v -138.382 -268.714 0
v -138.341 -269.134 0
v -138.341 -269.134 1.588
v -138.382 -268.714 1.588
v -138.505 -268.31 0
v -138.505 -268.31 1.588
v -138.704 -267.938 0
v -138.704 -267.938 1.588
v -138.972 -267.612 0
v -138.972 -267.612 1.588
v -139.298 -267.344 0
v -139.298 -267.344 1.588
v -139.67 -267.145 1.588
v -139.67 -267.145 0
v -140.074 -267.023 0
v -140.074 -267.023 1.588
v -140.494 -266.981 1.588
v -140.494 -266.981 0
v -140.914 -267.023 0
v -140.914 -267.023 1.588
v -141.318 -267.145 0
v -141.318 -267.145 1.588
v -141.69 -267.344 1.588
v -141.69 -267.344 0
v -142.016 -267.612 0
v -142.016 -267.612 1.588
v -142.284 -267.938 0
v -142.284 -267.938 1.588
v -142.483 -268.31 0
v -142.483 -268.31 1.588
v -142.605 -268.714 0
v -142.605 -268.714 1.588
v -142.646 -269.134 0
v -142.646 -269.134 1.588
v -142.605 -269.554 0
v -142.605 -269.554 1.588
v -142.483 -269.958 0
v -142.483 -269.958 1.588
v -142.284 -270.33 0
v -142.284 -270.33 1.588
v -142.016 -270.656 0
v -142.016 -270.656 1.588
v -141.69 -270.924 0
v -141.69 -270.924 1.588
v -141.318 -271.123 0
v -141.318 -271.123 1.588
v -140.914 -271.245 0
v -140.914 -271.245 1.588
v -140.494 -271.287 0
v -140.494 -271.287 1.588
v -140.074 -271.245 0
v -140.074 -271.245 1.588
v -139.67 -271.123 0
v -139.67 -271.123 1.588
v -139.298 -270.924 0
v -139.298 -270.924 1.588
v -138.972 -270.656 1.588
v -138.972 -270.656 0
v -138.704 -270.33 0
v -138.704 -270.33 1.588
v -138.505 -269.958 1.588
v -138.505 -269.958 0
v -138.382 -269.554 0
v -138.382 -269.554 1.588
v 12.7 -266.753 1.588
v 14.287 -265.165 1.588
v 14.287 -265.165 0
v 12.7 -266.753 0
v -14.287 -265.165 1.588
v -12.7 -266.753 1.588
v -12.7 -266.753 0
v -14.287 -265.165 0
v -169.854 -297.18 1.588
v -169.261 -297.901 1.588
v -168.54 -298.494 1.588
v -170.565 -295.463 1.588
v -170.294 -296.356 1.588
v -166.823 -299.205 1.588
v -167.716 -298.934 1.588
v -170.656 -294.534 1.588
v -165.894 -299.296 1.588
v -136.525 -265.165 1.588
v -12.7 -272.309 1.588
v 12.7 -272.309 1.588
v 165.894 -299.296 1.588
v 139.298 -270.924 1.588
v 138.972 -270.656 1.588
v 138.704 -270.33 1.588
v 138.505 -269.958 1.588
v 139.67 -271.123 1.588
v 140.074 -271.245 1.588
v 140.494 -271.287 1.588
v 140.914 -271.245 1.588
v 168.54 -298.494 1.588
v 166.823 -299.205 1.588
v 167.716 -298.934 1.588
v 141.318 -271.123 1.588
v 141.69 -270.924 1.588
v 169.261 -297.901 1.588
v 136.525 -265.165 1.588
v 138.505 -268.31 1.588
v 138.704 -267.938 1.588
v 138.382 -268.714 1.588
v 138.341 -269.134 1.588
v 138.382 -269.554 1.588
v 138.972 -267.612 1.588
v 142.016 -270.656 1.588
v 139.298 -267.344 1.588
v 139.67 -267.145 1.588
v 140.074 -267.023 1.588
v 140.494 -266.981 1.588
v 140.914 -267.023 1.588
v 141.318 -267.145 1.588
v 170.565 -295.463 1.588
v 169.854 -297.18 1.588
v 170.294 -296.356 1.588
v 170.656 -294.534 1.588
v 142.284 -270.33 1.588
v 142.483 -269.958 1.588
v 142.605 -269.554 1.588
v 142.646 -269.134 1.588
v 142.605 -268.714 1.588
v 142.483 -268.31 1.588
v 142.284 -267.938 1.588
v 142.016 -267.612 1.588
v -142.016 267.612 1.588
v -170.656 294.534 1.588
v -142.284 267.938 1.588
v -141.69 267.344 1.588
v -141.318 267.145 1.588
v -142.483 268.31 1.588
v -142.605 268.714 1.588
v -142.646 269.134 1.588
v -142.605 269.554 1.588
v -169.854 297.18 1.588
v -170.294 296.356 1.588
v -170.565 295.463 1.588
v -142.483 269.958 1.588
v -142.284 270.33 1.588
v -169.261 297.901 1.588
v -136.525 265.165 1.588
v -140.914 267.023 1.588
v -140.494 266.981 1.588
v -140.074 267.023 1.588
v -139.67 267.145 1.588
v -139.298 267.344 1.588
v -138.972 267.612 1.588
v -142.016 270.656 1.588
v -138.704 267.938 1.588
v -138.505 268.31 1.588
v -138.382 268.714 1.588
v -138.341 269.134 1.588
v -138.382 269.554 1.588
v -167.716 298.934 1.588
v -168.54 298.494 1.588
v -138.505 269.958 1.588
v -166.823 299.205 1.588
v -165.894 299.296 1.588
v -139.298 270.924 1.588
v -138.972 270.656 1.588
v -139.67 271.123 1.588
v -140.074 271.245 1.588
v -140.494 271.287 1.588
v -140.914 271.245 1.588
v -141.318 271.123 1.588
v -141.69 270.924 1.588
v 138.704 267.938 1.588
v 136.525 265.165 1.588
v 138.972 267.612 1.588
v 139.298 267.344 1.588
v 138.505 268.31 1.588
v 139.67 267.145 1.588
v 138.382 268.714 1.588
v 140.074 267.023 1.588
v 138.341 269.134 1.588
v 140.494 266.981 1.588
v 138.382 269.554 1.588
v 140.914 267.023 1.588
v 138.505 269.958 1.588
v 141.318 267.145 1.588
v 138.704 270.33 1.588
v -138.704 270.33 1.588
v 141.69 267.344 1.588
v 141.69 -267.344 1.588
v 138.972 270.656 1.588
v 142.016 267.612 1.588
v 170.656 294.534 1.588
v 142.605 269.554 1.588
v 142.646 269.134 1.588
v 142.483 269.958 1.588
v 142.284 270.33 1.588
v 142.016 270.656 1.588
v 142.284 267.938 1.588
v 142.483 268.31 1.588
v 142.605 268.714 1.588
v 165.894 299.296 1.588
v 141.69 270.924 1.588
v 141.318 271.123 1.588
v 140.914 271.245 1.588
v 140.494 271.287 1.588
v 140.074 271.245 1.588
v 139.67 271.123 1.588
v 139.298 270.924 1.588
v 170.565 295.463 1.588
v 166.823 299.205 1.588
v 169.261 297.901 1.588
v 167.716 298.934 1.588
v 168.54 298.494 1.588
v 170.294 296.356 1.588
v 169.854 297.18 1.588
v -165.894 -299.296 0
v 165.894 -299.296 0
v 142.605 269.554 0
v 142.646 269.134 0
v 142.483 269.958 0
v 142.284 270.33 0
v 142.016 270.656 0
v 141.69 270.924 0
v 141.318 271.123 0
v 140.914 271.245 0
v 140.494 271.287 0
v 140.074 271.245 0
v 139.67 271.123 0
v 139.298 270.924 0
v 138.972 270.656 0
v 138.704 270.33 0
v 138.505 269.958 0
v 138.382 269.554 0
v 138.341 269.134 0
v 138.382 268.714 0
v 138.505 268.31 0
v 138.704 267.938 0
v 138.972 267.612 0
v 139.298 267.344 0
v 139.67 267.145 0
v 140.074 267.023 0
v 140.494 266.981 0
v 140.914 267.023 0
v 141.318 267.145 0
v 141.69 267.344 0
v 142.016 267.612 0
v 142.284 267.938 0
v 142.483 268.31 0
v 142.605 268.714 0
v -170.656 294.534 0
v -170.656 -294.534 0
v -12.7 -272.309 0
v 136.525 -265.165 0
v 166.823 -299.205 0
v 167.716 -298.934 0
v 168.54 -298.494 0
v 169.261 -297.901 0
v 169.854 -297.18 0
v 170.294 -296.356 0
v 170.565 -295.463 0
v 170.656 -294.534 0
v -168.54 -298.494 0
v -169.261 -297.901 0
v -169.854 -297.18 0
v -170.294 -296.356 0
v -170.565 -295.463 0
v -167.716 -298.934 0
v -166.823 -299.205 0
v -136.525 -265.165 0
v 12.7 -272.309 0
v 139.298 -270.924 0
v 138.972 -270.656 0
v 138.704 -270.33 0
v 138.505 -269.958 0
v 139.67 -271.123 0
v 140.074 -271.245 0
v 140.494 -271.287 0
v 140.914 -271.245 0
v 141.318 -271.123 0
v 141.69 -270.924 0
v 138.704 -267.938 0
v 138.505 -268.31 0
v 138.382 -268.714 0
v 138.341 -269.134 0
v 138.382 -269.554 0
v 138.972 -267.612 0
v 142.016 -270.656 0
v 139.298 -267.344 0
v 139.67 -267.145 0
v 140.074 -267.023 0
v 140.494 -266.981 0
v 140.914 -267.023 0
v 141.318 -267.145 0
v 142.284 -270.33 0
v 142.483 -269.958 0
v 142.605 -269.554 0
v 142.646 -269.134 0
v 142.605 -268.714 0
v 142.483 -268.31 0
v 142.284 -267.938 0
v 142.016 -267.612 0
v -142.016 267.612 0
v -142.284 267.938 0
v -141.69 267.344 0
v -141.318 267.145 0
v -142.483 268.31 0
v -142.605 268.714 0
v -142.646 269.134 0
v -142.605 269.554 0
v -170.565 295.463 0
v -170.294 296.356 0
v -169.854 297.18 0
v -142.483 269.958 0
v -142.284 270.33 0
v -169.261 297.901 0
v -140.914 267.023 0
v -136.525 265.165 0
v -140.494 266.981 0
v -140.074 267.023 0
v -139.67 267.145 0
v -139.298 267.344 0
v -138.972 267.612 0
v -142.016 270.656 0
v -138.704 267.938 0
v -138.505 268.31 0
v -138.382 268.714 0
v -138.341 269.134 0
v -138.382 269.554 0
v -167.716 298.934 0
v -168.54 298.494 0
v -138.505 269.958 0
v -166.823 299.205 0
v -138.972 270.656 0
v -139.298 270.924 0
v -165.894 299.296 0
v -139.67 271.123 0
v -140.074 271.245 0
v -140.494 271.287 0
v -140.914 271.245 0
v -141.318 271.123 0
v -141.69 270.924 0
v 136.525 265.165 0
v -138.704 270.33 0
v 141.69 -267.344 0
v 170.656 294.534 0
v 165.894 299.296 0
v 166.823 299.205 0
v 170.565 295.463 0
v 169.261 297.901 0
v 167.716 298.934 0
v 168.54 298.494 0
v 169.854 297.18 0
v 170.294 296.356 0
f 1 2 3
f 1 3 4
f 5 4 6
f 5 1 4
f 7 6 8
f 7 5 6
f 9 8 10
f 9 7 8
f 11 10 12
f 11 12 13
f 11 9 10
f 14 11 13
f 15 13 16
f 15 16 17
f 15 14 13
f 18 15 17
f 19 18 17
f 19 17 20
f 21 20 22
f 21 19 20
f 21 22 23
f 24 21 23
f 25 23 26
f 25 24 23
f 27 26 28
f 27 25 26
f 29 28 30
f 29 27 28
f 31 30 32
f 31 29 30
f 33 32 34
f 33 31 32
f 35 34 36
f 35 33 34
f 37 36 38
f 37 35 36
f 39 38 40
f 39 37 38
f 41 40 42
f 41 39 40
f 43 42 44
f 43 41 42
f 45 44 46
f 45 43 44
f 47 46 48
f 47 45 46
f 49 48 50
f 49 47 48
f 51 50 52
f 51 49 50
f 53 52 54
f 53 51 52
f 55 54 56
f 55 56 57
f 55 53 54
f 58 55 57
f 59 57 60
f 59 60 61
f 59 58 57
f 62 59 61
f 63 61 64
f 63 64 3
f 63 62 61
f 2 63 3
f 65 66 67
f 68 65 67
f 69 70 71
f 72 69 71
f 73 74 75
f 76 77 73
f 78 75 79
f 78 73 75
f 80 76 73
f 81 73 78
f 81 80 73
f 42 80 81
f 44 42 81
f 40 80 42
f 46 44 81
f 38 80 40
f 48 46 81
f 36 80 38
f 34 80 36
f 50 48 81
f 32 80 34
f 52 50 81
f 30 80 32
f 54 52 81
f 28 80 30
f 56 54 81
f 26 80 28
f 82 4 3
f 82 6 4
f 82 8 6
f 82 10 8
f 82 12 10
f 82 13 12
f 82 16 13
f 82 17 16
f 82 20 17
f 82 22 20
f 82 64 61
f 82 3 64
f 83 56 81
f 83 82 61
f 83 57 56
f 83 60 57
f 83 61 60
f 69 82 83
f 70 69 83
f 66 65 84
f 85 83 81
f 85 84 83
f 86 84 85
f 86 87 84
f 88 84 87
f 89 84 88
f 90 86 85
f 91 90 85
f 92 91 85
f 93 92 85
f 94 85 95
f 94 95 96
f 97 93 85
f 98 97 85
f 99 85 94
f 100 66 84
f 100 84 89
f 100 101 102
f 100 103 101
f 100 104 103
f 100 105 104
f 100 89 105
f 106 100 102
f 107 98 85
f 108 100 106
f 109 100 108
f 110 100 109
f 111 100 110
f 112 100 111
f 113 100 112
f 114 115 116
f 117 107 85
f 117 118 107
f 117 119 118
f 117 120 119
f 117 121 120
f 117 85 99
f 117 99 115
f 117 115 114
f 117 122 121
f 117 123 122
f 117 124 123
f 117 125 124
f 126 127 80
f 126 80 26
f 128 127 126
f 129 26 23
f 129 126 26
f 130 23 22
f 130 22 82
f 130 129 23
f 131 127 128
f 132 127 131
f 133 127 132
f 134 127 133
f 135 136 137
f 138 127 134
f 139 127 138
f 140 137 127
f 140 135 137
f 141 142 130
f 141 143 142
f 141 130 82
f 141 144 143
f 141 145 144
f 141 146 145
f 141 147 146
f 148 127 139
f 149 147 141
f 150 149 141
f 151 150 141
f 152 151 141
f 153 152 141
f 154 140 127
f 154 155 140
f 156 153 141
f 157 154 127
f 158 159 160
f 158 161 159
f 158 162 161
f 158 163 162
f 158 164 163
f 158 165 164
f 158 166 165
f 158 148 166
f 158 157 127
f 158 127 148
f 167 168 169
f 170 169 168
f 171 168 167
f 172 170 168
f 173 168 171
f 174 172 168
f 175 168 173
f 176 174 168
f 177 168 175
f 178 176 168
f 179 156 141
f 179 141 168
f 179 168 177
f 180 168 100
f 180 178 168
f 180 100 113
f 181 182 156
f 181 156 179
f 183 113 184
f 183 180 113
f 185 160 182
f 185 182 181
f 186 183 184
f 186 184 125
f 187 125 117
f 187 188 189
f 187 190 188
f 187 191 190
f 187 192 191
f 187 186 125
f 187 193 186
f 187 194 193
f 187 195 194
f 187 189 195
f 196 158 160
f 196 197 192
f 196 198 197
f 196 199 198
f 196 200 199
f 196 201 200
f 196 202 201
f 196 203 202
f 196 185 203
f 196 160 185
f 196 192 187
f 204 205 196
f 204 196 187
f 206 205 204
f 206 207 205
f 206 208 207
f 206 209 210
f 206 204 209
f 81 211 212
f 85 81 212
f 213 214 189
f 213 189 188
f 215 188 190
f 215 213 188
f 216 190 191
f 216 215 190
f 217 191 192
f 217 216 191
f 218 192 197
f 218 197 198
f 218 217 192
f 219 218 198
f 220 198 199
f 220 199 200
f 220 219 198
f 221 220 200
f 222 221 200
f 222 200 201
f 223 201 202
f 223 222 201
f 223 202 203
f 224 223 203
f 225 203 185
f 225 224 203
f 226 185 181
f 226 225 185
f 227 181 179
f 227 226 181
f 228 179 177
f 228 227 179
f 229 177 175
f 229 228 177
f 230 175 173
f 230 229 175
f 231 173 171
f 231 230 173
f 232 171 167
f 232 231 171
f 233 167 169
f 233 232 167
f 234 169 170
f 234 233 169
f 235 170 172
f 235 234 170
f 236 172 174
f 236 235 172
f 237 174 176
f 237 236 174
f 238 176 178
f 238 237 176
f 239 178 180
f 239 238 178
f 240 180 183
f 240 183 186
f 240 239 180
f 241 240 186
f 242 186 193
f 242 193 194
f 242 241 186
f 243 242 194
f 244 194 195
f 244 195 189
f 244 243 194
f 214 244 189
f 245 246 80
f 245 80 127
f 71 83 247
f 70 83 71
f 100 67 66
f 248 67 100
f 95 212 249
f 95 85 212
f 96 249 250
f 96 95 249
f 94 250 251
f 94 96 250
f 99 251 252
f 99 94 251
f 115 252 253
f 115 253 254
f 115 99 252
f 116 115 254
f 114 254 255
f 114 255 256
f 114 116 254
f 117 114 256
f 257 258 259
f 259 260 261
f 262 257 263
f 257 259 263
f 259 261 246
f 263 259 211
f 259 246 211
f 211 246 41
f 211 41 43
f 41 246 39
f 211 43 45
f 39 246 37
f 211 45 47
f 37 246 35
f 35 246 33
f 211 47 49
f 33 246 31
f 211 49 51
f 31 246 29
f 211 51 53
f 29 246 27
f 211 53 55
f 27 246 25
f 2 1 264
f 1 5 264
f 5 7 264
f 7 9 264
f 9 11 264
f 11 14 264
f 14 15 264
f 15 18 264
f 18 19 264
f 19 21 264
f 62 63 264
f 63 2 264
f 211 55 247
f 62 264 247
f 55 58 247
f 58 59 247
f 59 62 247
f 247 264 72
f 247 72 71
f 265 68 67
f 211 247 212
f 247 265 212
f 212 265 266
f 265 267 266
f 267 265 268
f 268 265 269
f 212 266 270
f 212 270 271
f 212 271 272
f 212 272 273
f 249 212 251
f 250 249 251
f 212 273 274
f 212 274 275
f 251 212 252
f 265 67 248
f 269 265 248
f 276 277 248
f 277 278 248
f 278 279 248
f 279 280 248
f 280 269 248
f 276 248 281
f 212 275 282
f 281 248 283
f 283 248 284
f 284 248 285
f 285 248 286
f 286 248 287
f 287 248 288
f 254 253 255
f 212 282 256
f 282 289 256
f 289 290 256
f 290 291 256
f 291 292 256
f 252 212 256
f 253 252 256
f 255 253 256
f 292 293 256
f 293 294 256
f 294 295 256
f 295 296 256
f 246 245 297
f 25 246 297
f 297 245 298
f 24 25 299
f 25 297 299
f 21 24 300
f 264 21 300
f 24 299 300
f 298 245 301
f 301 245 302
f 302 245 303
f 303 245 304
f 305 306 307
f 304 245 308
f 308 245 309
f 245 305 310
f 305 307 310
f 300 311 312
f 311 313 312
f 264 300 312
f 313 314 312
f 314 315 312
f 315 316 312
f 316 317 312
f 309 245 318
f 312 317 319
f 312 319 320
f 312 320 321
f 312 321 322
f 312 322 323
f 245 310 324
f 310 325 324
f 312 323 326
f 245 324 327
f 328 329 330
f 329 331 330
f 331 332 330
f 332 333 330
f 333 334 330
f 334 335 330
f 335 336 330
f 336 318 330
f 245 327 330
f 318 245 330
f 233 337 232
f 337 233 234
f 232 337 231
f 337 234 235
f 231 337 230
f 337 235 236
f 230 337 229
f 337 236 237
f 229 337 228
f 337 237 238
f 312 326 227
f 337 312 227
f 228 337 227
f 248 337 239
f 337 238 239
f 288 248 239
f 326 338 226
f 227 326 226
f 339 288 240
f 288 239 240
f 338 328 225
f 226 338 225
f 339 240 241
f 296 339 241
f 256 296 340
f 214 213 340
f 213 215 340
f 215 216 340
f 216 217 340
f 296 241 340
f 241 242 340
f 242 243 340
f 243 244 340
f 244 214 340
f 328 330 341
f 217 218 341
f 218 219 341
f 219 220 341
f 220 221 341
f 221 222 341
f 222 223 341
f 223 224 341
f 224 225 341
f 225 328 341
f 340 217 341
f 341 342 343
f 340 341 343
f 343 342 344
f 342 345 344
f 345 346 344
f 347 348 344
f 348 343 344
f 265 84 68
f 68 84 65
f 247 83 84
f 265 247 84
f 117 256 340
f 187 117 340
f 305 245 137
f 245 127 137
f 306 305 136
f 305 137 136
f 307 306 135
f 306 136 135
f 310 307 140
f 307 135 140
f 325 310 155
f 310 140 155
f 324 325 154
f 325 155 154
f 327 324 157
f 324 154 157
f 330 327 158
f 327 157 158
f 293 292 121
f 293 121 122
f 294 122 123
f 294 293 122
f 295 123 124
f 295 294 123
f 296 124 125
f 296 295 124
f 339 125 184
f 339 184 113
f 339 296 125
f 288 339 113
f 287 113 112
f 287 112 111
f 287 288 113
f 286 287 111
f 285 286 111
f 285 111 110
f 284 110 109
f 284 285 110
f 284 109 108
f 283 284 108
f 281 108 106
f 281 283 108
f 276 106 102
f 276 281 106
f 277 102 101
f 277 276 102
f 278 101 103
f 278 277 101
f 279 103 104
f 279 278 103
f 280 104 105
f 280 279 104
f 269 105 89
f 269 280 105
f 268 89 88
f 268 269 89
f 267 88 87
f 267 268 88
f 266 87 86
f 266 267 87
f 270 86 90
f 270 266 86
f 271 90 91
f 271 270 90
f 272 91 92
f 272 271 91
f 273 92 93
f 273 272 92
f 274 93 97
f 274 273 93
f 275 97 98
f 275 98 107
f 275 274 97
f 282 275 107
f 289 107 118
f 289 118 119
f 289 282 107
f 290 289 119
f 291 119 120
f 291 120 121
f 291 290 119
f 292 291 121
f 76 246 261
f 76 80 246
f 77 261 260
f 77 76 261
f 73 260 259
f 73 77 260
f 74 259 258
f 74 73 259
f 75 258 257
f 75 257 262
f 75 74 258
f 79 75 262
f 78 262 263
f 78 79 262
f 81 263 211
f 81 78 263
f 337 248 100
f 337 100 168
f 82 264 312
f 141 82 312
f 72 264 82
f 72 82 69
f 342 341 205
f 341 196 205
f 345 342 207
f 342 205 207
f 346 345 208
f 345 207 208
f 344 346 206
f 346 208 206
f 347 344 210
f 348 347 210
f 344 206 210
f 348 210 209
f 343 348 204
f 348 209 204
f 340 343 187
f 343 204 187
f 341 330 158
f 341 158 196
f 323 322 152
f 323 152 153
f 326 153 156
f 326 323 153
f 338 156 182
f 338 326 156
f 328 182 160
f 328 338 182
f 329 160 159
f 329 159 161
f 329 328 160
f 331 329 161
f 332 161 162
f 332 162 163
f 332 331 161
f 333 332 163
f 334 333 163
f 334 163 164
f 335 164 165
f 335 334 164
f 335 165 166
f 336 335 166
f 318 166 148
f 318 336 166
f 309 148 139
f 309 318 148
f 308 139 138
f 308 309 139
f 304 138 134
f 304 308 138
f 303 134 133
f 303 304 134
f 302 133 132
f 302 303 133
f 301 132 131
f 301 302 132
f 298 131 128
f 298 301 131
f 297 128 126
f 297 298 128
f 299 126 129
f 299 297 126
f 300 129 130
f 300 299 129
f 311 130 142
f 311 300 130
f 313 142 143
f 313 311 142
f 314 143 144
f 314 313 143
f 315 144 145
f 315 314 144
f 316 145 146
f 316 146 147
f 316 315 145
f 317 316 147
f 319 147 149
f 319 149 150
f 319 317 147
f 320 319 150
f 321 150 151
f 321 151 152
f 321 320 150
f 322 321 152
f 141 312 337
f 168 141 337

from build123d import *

# Parameters (mm, degrees)
F0_W     = 341.3125
F0_H     = 598.5927322
F0_R     = 2.15265
F0_W_2   = 273.05
F0_H_2   = 530.3302322
F1_DEPTH = 1.5875
F2_R     = 4.7625
F3_W     = 25.4
F3_H     = 7.14375
F4_DEPTH = 1.5875
F5_SIZE  = 1.5875


with BuildPart() as f1:
    # F0 (on Top) → F1 (new body)
    with BuildSketch(Plane.XY):
        Rectangle(F0_W, F0_H)
        with Locations((-140.49375, -269.1338661)):
            Circle(F0_R, mode=Mode.SUBTRACT)
        with Locations((140.49375, -269.1338661)):
            Circle(F0_R, mode=Mode.SUBTRACT)
        with Locations((-140.49375, 269.1338661)):
            Circle(F0_R, mode=Mode.SUBTRACT)
        Rectangle(F0_W_2, F0_H_2, mode=Mode.SUBTRACT)
        with Locations((140.49375, 269.1338661)):
            Circle(F0_R, mode=Mode.SUBTRACT)
    extrude(amount=F1_DEPTH)

    # F2
    f2_edges = [f1.edges().sort_by_distance(p)[0] for p in [
        (-170.65625, 299.296366, 0.79375),
        (170.65625, 299.296366, 0.79375),
        (170.65625, -299.296366, 0.79375),
        (-170.65625, -299.296366, 0.79375),
    ]]
    fillet(f2_edges, radius=F2_R)

    # F3 (on face) → F4 (cut, through all)
    with BuildSketch(Plane.XY.offset(1.5875)):
        with Locations((0, -268.7369911)):
            Rectangle(F3_W, F3_H)
    extrude(amount=-F4_DEPTH, mode=Mode.SUBTRACT)

    # F5
    f5_edges = [f1.edges().sort_by_distance(p)[0] for p in [
        (12.7, -265.165116, 0.79375),
        (-12.7, -265.165116, 0.79375),
    ]]
    chamfer(f5_edges, length=F5_SIZE)


solid = f1.part
